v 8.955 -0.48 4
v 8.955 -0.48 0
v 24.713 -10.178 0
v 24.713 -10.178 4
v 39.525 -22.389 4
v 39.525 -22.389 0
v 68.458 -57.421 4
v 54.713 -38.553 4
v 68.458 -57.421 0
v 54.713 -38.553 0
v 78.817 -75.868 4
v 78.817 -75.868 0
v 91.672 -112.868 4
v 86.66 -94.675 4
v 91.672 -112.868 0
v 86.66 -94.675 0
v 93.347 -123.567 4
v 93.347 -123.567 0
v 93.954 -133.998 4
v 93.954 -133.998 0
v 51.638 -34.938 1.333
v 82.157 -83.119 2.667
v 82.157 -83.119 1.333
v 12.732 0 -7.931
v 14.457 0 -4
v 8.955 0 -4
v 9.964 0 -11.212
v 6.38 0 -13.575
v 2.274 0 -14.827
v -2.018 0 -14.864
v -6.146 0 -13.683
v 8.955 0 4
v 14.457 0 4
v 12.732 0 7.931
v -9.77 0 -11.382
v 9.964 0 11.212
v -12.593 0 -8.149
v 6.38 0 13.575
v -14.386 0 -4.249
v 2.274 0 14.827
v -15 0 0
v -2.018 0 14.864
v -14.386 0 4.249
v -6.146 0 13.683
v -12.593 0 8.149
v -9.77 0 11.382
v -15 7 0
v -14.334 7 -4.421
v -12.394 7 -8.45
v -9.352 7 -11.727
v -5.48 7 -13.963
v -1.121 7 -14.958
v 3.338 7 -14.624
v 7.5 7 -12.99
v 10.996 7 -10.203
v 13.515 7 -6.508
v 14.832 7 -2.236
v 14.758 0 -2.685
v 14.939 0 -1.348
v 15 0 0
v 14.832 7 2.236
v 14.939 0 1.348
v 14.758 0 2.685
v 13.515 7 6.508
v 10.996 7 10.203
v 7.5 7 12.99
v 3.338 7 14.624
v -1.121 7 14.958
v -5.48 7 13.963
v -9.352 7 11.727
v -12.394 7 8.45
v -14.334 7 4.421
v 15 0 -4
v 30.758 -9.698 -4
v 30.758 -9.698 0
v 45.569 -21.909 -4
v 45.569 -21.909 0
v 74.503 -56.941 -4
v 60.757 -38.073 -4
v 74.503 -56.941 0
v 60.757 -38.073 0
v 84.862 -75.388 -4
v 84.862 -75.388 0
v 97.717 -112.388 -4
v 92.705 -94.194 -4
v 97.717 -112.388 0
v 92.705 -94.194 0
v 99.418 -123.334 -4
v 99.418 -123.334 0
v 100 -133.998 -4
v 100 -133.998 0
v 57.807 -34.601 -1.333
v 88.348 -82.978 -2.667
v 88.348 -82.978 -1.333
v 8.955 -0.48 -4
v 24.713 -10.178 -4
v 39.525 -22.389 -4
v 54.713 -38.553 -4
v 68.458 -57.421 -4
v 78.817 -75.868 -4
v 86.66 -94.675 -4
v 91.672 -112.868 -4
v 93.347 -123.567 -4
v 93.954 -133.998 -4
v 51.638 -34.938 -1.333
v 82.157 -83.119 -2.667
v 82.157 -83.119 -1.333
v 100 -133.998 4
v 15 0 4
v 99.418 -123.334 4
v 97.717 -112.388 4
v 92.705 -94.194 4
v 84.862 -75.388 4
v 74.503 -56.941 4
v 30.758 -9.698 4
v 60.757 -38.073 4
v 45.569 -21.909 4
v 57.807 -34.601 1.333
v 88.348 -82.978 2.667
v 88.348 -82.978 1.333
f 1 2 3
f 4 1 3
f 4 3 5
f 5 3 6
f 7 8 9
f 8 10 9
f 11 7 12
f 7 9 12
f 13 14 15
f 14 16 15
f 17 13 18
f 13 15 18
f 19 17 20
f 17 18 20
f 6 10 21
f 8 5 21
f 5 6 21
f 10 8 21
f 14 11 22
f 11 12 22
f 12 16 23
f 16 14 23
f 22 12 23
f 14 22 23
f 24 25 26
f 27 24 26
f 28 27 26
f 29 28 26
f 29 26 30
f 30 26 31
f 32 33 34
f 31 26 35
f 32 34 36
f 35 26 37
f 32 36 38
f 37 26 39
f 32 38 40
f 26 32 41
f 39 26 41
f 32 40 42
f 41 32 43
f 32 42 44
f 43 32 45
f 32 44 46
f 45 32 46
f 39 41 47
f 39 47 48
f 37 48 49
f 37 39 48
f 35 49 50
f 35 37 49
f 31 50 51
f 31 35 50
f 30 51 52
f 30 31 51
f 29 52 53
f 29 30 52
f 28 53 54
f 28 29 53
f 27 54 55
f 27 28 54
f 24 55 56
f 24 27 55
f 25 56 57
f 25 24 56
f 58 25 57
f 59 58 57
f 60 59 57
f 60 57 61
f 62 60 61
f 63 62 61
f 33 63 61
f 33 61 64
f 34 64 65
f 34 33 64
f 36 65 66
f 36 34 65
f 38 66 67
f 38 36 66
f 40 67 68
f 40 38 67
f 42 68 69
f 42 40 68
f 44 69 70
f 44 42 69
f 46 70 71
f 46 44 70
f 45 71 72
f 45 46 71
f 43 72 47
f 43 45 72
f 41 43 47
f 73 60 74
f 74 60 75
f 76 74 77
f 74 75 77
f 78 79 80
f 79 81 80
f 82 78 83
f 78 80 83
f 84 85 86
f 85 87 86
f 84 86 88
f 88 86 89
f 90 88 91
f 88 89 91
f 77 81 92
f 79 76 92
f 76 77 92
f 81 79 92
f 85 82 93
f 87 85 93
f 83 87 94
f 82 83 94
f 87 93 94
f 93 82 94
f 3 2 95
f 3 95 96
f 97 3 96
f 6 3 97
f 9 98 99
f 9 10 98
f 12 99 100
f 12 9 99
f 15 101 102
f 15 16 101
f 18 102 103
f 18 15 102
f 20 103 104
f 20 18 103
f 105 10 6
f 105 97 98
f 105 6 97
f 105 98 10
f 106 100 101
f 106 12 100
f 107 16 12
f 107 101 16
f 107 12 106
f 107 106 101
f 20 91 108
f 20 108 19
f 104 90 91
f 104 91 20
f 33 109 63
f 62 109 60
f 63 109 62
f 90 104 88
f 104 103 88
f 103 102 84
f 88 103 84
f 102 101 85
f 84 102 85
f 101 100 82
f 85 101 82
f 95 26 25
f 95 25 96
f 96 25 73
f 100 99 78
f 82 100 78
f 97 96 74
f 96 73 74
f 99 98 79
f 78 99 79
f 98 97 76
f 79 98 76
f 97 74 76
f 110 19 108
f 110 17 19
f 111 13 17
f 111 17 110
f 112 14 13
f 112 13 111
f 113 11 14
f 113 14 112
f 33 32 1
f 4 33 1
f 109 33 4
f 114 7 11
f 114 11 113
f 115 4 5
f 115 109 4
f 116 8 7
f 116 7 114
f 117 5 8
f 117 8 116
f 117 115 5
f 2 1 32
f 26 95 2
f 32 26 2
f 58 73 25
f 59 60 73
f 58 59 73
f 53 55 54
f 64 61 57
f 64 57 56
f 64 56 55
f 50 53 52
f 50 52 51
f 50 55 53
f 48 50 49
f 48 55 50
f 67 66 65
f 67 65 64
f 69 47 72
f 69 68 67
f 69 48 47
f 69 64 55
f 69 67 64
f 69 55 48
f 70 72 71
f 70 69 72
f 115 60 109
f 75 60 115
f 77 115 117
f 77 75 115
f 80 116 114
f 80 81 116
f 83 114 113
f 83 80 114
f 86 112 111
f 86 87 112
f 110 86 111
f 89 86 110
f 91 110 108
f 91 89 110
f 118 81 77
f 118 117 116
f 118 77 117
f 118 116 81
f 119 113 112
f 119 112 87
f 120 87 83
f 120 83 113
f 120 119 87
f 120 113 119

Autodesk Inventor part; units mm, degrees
ref_plane "YZ Plane" through (0, 0, 0) normal (1, 0, 0) x (0, 1, 0)
ref_plane "XZ Plane" through (0, 0, 0) normal (0, 1, 0) x (-1, 0, 0)
ref_plane "XY Plane" through (0, 0, 0) normal (0, 0, 1) x (1, 0, 0)
sketch "Sketch1" plane through (0, 0, 0) normal (0, 1, 0) x (-1, 0, 0)
  circle A0 centre (0, 0) radius 15
  dimension "d0" = 30
extrude "Extrusion1" add sketch "Sketch1" along normal blind 7
sketch "Sketch2" plane through (0, 0, 0) normal (0, 0, 1) x (1, 0, 0)
  line L0 (0, -0.6683) -> (0, -150.6683)
  line L1 (0, -150.6683) -> (100, -150.6683)
  line L2 (15, 0) -> (-15, 0) projected
  line L3 (15, 0) -> (61.733, -24.0013) construction
  line L4 (61.733, -24.0013) -> (100, -85.3679) construction
  line L5 (100, -85.3679) -> (100, -133.998) construction
  spline S0 degree 3 poles (15, 0) (61.733, -24.0013) (100, -85.3679) (100, -133.998) knots 1 1 1 1 2 2 2 2
  line L6 (8.9554, -0.4801) -> (55.6884, -24.4814) construction
  line L7 (55.6884, -24.4814) -> (93.9554, -85.848) construction
  line L8 (93.9554, -85.848) -> (93.9554, -134.4781) construction
  spline S1 degree 3 poles (8.9554, -0.4801) (55.6884, -24.4814) (93.9554, -85.848) (93.9554, -134.4781) knots 1 1 1 1 2 2 2 2
  line L9 (100, -133.998) -> (93.9542, -133.998)
  line L10 (15, 0) -> (8.9554, 0)
  line L11 (8.9554, -0.4801) -> (8.9554, 0)
  point P0 (0, 0)
  dimension "d3" = 150
  dimension "d4" = 100
extrude "Extrusion2" add sketch "Sketch2" along normal mid plane 8
properties part number "preBuiltArm"
